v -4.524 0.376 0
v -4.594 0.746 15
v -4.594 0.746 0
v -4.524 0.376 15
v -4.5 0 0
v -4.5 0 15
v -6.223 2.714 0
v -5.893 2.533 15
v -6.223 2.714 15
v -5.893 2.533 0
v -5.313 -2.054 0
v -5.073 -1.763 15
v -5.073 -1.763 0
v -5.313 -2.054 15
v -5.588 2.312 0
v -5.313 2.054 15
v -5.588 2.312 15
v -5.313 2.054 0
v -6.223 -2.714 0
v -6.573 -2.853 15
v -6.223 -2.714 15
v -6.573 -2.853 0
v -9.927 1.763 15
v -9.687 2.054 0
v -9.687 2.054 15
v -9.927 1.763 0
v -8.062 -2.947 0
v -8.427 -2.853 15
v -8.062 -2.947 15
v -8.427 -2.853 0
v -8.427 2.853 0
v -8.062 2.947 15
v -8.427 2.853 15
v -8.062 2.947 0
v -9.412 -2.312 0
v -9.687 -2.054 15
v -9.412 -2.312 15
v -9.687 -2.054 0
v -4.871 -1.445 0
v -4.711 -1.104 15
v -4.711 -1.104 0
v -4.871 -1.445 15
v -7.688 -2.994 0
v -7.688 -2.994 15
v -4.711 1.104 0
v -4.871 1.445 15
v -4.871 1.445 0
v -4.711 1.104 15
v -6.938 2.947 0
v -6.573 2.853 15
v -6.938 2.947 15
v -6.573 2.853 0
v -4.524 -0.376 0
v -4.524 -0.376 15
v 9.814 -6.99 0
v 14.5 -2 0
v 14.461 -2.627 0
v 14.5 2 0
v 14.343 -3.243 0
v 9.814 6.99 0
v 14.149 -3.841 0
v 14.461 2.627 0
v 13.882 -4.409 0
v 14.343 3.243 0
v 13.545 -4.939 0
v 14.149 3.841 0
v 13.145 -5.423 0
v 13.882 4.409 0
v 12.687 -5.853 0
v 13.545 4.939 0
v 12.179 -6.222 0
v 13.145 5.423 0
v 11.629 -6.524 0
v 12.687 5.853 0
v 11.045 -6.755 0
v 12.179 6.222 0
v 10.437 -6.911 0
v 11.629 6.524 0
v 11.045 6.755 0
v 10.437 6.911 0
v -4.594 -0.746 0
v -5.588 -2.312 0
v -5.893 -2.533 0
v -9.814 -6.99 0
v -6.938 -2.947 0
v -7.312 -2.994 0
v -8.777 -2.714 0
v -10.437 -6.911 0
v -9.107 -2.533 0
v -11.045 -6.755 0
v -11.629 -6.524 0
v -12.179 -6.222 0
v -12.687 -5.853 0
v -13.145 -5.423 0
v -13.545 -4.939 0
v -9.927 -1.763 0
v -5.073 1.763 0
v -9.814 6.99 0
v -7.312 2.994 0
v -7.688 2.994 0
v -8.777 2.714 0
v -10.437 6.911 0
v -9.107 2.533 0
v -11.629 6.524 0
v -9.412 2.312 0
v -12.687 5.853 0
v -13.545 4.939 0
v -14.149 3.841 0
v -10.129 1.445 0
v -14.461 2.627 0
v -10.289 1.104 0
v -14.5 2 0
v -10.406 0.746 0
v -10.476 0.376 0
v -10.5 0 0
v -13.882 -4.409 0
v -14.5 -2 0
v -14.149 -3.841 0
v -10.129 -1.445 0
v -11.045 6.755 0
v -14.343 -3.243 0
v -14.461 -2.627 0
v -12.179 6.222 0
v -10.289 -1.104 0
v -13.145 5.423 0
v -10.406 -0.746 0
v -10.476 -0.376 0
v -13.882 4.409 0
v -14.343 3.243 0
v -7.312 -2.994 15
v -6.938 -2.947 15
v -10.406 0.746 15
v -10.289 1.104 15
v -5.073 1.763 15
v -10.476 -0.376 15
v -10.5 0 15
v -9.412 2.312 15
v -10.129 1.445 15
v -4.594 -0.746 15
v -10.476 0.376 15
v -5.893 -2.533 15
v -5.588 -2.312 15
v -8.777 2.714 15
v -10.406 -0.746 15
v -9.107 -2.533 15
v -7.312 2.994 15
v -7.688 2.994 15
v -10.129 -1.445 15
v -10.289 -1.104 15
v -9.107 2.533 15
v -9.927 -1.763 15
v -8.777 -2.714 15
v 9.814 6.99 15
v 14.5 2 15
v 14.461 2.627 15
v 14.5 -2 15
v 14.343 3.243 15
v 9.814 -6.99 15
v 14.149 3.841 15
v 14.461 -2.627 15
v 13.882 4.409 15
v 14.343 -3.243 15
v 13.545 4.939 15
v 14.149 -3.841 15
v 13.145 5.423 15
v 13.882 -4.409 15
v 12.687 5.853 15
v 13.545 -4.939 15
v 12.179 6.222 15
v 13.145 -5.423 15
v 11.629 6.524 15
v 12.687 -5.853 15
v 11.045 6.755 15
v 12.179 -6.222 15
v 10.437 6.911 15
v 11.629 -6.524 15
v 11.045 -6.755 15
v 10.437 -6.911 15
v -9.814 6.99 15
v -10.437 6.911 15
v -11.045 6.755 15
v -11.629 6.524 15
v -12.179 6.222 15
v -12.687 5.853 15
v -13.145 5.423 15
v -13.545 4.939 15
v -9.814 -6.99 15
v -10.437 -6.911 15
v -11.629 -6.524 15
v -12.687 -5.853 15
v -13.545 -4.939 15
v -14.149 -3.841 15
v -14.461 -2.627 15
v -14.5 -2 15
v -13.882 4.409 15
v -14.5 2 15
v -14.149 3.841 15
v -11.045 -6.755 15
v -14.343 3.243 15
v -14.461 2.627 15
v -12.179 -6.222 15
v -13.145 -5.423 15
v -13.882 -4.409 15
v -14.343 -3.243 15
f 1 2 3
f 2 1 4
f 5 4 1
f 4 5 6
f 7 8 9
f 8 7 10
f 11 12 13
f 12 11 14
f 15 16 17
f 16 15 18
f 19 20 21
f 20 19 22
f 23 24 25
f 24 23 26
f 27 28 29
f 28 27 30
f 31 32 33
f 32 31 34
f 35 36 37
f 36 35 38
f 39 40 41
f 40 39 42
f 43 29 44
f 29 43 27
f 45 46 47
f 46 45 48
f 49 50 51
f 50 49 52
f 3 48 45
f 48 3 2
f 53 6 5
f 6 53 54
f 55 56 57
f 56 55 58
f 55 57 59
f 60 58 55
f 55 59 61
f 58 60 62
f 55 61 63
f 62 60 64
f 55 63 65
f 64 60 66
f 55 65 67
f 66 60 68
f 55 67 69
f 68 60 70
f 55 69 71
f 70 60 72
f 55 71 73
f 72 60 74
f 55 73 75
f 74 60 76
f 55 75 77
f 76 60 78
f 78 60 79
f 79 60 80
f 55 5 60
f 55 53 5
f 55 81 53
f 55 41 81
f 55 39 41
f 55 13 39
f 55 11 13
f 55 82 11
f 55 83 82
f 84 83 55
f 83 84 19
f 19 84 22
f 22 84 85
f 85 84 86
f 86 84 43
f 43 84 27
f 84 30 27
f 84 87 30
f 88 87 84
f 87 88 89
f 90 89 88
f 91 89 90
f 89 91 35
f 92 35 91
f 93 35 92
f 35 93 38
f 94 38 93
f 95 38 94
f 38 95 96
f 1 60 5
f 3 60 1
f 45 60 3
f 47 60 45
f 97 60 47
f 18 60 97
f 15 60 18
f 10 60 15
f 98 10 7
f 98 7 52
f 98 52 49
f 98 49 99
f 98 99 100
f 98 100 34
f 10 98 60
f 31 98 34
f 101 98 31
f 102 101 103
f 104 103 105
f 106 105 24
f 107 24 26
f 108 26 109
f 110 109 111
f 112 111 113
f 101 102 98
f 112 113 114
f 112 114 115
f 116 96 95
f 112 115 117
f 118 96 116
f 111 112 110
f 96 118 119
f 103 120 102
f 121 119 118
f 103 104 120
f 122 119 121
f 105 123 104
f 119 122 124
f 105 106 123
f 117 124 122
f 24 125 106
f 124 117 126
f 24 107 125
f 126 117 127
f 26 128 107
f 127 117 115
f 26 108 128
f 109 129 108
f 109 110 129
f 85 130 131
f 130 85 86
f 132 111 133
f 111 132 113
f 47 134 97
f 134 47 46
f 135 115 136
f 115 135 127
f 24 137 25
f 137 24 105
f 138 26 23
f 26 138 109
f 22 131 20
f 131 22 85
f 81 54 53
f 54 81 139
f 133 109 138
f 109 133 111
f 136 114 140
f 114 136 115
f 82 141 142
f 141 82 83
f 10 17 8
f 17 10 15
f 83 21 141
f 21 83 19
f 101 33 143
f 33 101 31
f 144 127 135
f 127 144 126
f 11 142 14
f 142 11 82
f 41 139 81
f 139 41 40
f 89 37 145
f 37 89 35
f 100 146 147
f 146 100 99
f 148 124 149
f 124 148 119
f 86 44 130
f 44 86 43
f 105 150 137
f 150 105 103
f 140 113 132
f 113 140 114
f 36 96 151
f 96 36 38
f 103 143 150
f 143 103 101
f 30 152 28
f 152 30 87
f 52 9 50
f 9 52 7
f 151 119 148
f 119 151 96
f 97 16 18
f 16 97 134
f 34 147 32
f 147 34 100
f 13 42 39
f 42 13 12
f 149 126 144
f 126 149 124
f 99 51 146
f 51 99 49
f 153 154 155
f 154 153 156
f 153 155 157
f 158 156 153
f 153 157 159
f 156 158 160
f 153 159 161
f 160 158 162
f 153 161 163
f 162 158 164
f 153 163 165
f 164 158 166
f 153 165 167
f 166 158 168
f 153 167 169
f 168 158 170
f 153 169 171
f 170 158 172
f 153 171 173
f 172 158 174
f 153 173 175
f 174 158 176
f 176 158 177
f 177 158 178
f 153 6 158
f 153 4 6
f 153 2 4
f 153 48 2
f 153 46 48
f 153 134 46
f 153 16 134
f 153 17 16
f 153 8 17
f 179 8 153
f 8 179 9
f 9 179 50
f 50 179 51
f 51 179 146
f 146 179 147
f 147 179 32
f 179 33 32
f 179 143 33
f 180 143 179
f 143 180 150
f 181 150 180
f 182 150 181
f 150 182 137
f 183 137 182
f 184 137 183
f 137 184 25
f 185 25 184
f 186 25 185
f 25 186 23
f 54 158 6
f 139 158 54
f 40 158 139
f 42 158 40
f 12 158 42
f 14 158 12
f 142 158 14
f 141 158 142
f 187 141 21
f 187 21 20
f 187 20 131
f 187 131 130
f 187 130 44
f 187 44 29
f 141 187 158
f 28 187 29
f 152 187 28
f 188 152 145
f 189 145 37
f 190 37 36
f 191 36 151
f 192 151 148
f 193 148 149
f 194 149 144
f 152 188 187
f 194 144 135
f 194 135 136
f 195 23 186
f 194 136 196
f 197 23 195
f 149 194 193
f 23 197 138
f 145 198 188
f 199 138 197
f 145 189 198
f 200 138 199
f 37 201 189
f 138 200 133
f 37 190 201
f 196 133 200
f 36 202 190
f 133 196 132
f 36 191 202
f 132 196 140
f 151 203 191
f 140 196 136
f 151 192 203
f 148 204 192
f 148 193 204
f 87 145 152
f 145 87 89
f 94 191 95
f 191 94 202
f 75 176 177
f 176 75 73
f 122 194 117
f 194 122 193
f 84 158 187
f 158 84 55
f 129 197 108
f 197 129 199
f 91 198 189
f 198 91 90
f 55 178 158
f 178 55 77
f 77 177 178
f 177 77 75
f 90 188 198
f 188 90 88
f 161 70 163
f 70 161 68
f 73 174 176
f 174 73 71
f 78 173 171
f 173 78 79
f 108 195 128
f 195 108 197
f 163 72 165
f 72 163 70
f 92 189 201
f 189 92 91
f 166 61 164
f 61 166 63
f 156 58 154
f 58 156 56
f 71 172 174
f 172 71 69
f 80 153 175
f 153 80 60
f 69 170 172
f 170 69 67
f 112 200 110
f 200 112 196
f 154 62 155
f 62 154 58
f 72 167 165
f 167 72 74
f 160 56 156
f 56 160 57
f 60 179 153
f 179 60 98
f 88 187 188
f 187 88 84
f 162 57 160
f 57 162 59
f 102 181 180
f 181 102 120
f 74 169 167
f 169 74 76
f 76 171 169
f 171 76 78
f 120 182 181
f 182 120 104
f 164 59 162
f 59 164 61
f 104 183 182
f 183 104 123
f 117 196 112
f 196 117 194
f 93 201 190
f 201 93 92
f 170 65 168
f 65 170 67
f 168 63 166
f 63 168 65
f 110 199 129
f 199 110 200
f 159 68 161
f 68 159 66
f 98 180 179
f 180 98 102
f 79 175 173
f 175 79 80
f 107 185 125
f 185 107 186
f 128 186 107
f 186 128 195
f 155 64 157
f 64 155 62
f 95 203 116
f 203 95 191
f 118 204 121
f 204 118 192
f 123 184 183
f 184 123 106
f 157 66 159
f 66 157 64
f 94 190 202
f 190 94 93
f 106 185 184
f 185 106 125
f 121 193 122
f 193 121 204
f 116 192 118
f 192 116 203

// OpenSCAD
$fn = 50;


difference() {
	union() {
		hull() {
			translate(v = [-9.5000000000, 2.0000000000, 0]) {
				cylinder(h = 15, r = 5);
			}
			translate(v = [9.5000000000, 2.0000000000, 0]) {
				cylinder(h = 15, r = 5);
			}
			translate(v = [-9.5000000000, -2.0000000000, 0]) {
				cylinder(h = 15, r = 5);
			}
			translate(v = [9.5000000000, -2.0000000000, 0]) {
				cylinder(h = 15, r = 5);
			}
		}
	}
	union() {
		translate(v = [-7.5000000000, 0.0000000000, 0]) {
			cylinder(h = 15, r = 3.0000000000);
		}
		translate(v = [-7.5000000000, 0.0000000000, 0]) {
			cylinder(h = 15, r = 1.5000000000);
		}
		translate(v = [-7.5000000000, 0.0000000000, 0]) {
			cylinder(h = 15, r = 1.5000000000);
		}
		translate(v = [-7.5000000000, 0.0000000000, 0]) {
			cylinder(h = 15, r = 1.5000000000);
		}
	}
}
